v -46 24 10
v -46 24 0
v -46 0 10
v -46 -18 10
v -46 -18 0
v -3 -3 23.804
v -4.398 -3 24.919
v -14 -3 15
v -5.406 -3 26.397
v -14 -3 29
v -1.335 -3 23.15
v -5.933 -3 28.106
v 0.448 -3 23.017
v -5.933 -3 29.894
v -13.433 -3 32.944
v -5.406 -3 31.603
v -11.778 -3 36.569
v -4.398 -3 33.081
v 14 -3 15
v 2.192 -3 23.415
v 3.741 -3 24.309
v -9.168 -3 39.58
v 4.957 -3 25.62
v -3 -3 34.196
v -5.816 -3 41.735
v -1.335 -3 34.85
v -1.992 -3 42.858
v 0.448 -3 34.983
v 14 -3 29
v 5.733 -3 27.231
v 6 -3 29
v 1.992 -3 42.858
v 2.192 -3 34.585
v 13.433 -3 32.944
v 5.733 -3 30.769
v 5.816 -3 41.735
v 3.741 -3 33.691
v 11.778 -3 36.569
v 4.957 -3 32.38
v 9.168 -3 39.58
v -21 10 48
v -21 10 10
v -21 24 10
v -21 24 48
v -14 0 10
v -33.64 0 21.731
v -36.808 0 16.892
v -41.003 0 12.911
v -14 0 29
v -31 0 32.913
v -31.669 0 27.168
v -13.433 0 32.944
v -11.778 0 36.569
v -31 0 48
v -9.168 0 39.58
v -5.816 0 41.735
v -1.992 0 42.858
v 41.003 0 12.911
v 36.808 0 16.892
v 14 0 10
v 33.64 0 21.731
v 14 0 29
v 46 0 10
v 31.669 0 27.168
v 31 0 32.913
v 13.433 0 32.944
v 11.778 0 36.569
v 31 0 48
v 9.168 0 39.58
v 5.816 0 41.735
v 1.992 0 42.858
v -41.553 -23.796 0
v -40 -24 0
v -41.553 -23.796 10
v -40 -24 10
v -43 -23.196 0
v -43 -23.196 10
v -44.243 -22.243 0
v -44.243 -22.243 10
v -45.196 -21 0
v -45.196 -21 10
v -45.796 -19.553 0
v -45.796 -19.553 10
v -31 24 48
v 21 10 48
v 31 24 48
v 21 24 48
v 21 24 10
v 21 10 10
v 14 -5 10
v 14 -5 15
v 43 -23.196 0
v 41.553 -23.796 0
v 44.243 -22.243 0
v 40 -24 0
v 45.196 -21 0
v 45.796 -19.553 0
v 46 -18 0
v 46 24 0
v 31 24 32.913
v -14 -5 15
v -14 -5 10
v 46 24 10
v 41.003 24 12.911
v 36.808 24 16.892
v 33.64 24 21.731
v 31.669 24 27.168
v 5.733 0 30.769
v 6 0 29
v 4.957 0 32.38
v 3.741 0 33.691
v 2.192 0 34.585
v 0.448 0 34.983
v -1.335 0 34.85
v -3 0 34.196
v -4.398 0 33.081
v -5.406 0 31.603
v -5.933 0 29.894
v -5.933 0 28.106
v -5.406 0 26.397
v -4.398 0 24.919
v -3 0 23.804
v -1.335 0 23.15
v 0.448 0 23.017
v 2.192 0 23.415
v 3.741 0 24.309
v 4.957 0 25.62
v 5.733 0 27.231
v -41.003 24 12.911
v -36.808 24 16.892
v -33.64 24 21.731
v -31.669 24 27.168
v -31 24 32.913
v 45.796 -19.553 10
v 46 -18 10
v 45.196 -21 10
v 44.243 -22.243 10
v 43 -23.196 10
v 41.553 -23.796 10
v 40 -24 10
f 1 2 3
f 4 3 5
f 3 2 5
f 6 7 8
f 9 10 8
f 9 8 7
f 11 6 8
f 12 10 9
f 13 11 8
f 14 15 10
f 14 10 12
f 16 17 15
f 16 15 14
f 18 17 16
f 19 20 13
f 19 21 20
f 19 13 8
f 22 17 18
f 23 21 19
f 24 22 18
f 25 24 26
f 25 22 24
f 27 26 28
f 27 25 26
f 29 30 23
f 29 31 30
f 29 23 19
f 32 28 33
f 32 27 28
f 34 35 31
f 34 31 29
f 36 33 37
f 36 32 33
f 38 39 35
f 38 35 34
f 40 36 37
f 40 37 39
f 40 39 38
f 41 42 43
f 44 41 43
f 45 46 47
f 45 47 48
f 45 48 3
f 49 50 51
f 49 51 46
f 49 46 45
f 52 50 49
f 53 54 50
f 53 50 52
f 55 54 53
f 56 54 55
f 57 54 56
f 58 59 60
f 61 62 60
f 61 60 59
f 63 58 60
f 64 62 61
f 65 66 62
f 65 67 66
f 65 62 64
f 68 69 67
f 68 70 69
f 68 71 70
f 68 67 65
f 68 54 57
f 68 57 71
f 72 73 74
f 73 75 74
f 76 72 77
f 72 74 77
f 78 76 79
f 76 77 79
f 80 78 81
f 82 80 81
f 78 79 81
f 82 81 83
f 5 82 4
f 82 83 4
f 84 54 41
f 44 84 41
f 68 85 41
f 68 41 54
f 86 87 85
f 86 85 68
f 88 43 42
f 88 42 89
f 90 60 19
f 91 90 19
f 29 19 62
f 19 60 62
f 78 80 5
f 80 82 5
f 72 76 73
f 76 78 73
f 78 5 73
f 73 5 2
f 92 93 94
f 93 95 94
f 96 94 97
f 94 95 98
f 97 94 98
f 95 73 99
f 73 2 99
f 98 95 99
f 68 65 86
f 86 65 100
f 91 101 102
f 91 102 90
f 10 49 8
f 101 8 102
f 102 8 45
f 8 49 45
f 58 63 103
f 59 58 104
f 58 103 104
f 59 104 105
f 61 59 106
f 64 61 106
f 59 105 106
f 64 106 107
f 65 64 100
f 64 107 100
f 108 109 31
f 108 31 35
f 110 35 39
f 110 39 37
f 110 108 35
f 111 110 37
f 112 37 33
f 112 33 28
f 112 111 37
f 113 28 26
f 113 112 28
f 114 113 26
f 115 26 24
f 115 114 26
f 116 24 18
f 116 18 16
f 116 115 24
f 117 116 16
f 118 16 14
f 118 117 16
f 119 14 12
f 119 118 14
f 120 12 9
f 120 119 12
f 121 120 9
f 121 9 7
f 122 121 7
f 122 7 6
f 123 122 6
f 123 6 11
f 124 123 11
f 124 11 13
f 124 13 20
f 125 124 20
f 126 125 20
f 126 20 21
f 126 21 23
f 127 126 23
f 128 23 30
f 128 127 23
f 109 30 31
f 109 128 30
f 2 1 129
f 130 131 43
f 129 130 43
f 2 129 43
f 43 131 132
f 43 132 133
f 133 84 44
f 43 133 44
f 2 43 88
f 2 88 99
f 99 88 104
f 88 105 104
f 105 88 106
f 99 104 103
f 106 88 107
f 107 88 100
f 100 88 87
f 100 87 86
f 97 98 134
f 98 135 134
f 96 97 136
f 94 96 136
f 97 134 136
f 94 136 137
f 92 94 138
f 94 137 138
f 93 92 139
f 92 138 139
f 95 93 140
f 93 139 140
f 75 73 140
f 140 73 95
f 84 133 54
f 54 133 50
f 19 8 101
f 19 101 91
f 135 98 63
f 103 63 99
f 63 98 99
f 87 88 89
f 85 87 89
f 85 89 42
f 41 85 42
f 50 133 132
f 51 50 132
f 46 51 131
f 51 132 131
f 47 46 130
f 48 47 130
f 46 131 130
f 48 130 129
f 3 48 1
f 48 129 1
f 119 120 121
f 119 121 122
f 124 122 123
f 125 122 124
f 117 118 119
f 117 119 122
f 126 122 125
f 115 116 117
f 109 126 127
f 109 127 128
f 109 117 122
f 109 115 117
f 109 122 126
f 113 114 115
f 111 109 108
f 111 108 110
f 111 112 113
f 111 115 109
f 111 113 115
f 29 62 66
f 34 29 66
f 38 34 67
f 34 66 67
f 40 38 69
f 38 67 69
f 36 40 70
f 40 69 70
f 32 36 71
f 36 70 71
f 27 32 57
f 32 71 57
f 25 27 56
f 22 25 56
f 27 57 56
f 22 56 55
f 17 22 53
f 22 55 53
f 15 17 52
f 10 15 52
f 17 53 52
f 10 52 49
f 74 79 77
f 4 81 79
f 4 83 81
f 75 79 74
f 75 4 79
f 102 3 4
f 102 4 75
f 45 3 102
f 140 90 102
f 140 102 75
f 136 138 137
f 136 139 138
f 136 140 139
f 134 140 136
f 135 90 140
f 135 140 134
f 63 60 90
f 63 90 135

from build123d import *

# Parameters (mm, degrees)
F1_DEPTH    = 48
F0_W        = 42
F0_H        = 14
F2_DEPTH    = 10
F3_T1_DEPTH = 24
F4_T1_DEPTH = 24
F5_R        = 6
F6_DEPTH    = 3
F5_W        = 28
F5_H        = 5
F7_DEPTH    = 3
F8_R        = 6
F9_R        = 6
F10_W       = 28
F10_H       = 5
F11_DEPTH   = 5


# Not quite as in the source:
# - a fillet or chamfer that OpenCascade refuses, or shapes differently, is made with other operations: its cross-section is extruded or revolved along the edge and cut away or added


with BuildPart() as f1:
    # F0 (on Top) → F1 (new body)
    with BuildSketch(Plane.XY):
        Polygon((31, 0), (31, 24), (21, 24), (21, 10), (-21, 10), (-21, 24), (-31, 24), (-31, 0), align=None)
    extrude(amount=F1_DEPTH)

    # F0 (on Top) → F2 (join)
    with BuildSketch(Plane.XY):
        Polygon((-46, -24), (46, -24), (46, 24), (31, 24), (31, 0), (-31, 0), (-31, 24), (-46, 24), align=None)
        Polygon((31, 0), (31, 24), (21, 24), (21, 10), (-21, 10), (-21, 24), (-31, 24), (-31, 0), align=None)
        with Locations((0, 17)):
            Rectangle(F0_W, F0_H)
    extrude(amount=F2_DEPTH)

    # F3: fillet of radius 25 on 1 edges, made by hand

    # F3_s2 → F3_t1 (join)
    with BuildSketch(Plane.XZ.offset(-24)):
        with BuildLine():
            ThreePointArc((46, 10), (35.0834993366, 19.2198145372), (31, 32.9128784748))
            Line((31, 32.9128784748), (31, 10))
            Line((31, 10), (46, 10))
        make_face()
    extrude(amount=F3_T1_DEPTH)

    # F4: fillet of radius 25 on 1 edges, made by hand

    # F4_s2 → F4_t1 (join)
    with BuildSketch(Plane.XZ.offset(-24)):
        with BuildLine():
            ThreePointArc((-31, 32.9128784748), (-35.0834993366, 19.2198145372), (-46, 10))
            Line((-46, 10), (-31, 10))
            Line((-31, 10), (-31, 32.9128784748))
        make_face()
    extrude(amount=F4_T1_DEPTH)

    # F5 (on face) → F6 (join)
    with BuildSketch(Plane.XZ):
        with BuildLine():
            Line((14, 15), (14, 29))
            ThreePointArc((14, 29), (0, 43), (-14, 29))
            Line((-14, 29), (-14, 15))
            Line((-14, 15), (14, 15))
        make_face()
        with Locations((0, 29)):
            Circle(F5_R, mode=Mode.SUBTRACT)
    extrude(amount=F6_DEPTH)

    # F5 (on face) → F7 (join)
    with BuildSketch(Plane.XZ):
        with BuildLine():
            Line((14, 15), (14, 29))
            ThreePointArc((14, 29), (0, 43), (-14, 29))
            Line((-14, 29), (-14, 15))
            Line((-14, 15), (14, 15))
        make_face()
        with Locations((0, 29)):
            Circle(F5_R, mode=Mode.SUBTRACT)
        with Locations((0, 12.5)):
            Rectangle(F5_W, F5_H)
    extrude(amount=F7_DEPTH)

    # F8
    f8_edges = [f1.edges().sort_by_distance(p)[0] for p in [
        (46, -24, 5),
    ]]
    fillet(f8_edges, radius=F8_R)

    # F9
    f9_edges = [f1.edges().sort_by_distance(p)[0] for p in [
        (-46, -24, 5),
    ]]
    fillet(f9_edges, radius=F9_R)

    # F10 (on face) → F11 (join)
    with BuildSketch(Plane.XZ):
        with Locations((0, 12.5)):
            Rectangle(F10_W, F10_H)
    extrude(amount=F11_DEPTH)


solid = f1.part
